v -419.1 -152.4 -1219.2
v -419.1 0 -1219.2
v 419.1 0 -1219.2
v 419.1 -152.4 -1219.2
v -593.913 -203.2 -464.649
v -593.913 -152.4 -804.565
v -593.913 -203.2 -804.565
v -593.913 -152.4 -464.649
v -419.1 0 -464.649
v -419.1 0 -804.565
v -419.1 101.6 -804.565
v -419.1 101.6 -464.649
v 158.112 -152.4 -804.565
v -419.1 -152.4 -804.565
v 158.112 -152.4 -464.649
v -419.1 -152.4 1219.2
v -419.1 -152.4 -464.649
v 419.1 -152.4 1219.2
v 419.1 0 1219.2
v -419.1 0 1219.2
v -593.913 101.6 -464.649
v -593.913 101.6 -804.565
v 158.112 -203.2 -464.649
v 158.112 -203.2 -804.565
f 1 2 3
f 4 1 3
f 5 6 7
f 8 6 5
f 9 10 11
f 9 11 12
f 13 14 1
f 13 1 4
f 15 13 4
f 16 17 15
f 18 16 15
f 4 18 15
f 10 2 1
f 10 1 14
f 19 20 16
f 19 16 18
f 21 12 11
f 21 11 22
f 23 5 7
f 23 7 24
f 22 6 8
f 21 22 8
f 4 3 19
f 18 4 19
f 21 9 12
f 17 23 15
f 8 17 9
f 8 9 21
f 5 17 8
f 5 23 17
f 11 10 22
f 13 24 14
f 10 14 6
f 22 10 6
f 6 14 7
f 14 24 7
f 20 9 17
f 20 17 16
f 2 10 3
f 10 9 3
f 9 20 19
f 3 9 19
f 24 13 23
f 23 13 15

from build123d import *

# Parameters (mm, degrees)
F0_W     = 838.2
F0_H     = 2438.4
F1_DEPTH = 152.4
F2_W     = 752.025268
F2_H     = 339.915395
F3_DEPTH = 50.8
F4_W     = 174.812899
F4_H     = 339.915395
F5_DEPTH = 254


with BuildPart() as f1:
    # F0 (on Front) → F1 (new body)
    with BuildSketch(Plane.XZ):
        Rectangle(F0_W, F0_H)
    extrude(amount=F1_DEPTH)

    # F2 (on face) → F3 (join)
    with BuildSketch(Plane.XZ.offset(152.4)):
        with Locations((-217.900265, -634.607195)):
            Rectangle(F2_W, F2_H)
    extrude(amount=F3_DEPTH)

    # F4 (on face) → F5 (join)
    with BuildSketch(Plane(origin=(0, -152.4, 0), x_dir=(-1, 0, 0), z_dir=(0, 1, 0))):
        with Locations((506.506449, -634.607195)):
            Rectangle(F4_W, F4_H)
    extrude(amount=F5_DEPTH)


solid = f1.part
